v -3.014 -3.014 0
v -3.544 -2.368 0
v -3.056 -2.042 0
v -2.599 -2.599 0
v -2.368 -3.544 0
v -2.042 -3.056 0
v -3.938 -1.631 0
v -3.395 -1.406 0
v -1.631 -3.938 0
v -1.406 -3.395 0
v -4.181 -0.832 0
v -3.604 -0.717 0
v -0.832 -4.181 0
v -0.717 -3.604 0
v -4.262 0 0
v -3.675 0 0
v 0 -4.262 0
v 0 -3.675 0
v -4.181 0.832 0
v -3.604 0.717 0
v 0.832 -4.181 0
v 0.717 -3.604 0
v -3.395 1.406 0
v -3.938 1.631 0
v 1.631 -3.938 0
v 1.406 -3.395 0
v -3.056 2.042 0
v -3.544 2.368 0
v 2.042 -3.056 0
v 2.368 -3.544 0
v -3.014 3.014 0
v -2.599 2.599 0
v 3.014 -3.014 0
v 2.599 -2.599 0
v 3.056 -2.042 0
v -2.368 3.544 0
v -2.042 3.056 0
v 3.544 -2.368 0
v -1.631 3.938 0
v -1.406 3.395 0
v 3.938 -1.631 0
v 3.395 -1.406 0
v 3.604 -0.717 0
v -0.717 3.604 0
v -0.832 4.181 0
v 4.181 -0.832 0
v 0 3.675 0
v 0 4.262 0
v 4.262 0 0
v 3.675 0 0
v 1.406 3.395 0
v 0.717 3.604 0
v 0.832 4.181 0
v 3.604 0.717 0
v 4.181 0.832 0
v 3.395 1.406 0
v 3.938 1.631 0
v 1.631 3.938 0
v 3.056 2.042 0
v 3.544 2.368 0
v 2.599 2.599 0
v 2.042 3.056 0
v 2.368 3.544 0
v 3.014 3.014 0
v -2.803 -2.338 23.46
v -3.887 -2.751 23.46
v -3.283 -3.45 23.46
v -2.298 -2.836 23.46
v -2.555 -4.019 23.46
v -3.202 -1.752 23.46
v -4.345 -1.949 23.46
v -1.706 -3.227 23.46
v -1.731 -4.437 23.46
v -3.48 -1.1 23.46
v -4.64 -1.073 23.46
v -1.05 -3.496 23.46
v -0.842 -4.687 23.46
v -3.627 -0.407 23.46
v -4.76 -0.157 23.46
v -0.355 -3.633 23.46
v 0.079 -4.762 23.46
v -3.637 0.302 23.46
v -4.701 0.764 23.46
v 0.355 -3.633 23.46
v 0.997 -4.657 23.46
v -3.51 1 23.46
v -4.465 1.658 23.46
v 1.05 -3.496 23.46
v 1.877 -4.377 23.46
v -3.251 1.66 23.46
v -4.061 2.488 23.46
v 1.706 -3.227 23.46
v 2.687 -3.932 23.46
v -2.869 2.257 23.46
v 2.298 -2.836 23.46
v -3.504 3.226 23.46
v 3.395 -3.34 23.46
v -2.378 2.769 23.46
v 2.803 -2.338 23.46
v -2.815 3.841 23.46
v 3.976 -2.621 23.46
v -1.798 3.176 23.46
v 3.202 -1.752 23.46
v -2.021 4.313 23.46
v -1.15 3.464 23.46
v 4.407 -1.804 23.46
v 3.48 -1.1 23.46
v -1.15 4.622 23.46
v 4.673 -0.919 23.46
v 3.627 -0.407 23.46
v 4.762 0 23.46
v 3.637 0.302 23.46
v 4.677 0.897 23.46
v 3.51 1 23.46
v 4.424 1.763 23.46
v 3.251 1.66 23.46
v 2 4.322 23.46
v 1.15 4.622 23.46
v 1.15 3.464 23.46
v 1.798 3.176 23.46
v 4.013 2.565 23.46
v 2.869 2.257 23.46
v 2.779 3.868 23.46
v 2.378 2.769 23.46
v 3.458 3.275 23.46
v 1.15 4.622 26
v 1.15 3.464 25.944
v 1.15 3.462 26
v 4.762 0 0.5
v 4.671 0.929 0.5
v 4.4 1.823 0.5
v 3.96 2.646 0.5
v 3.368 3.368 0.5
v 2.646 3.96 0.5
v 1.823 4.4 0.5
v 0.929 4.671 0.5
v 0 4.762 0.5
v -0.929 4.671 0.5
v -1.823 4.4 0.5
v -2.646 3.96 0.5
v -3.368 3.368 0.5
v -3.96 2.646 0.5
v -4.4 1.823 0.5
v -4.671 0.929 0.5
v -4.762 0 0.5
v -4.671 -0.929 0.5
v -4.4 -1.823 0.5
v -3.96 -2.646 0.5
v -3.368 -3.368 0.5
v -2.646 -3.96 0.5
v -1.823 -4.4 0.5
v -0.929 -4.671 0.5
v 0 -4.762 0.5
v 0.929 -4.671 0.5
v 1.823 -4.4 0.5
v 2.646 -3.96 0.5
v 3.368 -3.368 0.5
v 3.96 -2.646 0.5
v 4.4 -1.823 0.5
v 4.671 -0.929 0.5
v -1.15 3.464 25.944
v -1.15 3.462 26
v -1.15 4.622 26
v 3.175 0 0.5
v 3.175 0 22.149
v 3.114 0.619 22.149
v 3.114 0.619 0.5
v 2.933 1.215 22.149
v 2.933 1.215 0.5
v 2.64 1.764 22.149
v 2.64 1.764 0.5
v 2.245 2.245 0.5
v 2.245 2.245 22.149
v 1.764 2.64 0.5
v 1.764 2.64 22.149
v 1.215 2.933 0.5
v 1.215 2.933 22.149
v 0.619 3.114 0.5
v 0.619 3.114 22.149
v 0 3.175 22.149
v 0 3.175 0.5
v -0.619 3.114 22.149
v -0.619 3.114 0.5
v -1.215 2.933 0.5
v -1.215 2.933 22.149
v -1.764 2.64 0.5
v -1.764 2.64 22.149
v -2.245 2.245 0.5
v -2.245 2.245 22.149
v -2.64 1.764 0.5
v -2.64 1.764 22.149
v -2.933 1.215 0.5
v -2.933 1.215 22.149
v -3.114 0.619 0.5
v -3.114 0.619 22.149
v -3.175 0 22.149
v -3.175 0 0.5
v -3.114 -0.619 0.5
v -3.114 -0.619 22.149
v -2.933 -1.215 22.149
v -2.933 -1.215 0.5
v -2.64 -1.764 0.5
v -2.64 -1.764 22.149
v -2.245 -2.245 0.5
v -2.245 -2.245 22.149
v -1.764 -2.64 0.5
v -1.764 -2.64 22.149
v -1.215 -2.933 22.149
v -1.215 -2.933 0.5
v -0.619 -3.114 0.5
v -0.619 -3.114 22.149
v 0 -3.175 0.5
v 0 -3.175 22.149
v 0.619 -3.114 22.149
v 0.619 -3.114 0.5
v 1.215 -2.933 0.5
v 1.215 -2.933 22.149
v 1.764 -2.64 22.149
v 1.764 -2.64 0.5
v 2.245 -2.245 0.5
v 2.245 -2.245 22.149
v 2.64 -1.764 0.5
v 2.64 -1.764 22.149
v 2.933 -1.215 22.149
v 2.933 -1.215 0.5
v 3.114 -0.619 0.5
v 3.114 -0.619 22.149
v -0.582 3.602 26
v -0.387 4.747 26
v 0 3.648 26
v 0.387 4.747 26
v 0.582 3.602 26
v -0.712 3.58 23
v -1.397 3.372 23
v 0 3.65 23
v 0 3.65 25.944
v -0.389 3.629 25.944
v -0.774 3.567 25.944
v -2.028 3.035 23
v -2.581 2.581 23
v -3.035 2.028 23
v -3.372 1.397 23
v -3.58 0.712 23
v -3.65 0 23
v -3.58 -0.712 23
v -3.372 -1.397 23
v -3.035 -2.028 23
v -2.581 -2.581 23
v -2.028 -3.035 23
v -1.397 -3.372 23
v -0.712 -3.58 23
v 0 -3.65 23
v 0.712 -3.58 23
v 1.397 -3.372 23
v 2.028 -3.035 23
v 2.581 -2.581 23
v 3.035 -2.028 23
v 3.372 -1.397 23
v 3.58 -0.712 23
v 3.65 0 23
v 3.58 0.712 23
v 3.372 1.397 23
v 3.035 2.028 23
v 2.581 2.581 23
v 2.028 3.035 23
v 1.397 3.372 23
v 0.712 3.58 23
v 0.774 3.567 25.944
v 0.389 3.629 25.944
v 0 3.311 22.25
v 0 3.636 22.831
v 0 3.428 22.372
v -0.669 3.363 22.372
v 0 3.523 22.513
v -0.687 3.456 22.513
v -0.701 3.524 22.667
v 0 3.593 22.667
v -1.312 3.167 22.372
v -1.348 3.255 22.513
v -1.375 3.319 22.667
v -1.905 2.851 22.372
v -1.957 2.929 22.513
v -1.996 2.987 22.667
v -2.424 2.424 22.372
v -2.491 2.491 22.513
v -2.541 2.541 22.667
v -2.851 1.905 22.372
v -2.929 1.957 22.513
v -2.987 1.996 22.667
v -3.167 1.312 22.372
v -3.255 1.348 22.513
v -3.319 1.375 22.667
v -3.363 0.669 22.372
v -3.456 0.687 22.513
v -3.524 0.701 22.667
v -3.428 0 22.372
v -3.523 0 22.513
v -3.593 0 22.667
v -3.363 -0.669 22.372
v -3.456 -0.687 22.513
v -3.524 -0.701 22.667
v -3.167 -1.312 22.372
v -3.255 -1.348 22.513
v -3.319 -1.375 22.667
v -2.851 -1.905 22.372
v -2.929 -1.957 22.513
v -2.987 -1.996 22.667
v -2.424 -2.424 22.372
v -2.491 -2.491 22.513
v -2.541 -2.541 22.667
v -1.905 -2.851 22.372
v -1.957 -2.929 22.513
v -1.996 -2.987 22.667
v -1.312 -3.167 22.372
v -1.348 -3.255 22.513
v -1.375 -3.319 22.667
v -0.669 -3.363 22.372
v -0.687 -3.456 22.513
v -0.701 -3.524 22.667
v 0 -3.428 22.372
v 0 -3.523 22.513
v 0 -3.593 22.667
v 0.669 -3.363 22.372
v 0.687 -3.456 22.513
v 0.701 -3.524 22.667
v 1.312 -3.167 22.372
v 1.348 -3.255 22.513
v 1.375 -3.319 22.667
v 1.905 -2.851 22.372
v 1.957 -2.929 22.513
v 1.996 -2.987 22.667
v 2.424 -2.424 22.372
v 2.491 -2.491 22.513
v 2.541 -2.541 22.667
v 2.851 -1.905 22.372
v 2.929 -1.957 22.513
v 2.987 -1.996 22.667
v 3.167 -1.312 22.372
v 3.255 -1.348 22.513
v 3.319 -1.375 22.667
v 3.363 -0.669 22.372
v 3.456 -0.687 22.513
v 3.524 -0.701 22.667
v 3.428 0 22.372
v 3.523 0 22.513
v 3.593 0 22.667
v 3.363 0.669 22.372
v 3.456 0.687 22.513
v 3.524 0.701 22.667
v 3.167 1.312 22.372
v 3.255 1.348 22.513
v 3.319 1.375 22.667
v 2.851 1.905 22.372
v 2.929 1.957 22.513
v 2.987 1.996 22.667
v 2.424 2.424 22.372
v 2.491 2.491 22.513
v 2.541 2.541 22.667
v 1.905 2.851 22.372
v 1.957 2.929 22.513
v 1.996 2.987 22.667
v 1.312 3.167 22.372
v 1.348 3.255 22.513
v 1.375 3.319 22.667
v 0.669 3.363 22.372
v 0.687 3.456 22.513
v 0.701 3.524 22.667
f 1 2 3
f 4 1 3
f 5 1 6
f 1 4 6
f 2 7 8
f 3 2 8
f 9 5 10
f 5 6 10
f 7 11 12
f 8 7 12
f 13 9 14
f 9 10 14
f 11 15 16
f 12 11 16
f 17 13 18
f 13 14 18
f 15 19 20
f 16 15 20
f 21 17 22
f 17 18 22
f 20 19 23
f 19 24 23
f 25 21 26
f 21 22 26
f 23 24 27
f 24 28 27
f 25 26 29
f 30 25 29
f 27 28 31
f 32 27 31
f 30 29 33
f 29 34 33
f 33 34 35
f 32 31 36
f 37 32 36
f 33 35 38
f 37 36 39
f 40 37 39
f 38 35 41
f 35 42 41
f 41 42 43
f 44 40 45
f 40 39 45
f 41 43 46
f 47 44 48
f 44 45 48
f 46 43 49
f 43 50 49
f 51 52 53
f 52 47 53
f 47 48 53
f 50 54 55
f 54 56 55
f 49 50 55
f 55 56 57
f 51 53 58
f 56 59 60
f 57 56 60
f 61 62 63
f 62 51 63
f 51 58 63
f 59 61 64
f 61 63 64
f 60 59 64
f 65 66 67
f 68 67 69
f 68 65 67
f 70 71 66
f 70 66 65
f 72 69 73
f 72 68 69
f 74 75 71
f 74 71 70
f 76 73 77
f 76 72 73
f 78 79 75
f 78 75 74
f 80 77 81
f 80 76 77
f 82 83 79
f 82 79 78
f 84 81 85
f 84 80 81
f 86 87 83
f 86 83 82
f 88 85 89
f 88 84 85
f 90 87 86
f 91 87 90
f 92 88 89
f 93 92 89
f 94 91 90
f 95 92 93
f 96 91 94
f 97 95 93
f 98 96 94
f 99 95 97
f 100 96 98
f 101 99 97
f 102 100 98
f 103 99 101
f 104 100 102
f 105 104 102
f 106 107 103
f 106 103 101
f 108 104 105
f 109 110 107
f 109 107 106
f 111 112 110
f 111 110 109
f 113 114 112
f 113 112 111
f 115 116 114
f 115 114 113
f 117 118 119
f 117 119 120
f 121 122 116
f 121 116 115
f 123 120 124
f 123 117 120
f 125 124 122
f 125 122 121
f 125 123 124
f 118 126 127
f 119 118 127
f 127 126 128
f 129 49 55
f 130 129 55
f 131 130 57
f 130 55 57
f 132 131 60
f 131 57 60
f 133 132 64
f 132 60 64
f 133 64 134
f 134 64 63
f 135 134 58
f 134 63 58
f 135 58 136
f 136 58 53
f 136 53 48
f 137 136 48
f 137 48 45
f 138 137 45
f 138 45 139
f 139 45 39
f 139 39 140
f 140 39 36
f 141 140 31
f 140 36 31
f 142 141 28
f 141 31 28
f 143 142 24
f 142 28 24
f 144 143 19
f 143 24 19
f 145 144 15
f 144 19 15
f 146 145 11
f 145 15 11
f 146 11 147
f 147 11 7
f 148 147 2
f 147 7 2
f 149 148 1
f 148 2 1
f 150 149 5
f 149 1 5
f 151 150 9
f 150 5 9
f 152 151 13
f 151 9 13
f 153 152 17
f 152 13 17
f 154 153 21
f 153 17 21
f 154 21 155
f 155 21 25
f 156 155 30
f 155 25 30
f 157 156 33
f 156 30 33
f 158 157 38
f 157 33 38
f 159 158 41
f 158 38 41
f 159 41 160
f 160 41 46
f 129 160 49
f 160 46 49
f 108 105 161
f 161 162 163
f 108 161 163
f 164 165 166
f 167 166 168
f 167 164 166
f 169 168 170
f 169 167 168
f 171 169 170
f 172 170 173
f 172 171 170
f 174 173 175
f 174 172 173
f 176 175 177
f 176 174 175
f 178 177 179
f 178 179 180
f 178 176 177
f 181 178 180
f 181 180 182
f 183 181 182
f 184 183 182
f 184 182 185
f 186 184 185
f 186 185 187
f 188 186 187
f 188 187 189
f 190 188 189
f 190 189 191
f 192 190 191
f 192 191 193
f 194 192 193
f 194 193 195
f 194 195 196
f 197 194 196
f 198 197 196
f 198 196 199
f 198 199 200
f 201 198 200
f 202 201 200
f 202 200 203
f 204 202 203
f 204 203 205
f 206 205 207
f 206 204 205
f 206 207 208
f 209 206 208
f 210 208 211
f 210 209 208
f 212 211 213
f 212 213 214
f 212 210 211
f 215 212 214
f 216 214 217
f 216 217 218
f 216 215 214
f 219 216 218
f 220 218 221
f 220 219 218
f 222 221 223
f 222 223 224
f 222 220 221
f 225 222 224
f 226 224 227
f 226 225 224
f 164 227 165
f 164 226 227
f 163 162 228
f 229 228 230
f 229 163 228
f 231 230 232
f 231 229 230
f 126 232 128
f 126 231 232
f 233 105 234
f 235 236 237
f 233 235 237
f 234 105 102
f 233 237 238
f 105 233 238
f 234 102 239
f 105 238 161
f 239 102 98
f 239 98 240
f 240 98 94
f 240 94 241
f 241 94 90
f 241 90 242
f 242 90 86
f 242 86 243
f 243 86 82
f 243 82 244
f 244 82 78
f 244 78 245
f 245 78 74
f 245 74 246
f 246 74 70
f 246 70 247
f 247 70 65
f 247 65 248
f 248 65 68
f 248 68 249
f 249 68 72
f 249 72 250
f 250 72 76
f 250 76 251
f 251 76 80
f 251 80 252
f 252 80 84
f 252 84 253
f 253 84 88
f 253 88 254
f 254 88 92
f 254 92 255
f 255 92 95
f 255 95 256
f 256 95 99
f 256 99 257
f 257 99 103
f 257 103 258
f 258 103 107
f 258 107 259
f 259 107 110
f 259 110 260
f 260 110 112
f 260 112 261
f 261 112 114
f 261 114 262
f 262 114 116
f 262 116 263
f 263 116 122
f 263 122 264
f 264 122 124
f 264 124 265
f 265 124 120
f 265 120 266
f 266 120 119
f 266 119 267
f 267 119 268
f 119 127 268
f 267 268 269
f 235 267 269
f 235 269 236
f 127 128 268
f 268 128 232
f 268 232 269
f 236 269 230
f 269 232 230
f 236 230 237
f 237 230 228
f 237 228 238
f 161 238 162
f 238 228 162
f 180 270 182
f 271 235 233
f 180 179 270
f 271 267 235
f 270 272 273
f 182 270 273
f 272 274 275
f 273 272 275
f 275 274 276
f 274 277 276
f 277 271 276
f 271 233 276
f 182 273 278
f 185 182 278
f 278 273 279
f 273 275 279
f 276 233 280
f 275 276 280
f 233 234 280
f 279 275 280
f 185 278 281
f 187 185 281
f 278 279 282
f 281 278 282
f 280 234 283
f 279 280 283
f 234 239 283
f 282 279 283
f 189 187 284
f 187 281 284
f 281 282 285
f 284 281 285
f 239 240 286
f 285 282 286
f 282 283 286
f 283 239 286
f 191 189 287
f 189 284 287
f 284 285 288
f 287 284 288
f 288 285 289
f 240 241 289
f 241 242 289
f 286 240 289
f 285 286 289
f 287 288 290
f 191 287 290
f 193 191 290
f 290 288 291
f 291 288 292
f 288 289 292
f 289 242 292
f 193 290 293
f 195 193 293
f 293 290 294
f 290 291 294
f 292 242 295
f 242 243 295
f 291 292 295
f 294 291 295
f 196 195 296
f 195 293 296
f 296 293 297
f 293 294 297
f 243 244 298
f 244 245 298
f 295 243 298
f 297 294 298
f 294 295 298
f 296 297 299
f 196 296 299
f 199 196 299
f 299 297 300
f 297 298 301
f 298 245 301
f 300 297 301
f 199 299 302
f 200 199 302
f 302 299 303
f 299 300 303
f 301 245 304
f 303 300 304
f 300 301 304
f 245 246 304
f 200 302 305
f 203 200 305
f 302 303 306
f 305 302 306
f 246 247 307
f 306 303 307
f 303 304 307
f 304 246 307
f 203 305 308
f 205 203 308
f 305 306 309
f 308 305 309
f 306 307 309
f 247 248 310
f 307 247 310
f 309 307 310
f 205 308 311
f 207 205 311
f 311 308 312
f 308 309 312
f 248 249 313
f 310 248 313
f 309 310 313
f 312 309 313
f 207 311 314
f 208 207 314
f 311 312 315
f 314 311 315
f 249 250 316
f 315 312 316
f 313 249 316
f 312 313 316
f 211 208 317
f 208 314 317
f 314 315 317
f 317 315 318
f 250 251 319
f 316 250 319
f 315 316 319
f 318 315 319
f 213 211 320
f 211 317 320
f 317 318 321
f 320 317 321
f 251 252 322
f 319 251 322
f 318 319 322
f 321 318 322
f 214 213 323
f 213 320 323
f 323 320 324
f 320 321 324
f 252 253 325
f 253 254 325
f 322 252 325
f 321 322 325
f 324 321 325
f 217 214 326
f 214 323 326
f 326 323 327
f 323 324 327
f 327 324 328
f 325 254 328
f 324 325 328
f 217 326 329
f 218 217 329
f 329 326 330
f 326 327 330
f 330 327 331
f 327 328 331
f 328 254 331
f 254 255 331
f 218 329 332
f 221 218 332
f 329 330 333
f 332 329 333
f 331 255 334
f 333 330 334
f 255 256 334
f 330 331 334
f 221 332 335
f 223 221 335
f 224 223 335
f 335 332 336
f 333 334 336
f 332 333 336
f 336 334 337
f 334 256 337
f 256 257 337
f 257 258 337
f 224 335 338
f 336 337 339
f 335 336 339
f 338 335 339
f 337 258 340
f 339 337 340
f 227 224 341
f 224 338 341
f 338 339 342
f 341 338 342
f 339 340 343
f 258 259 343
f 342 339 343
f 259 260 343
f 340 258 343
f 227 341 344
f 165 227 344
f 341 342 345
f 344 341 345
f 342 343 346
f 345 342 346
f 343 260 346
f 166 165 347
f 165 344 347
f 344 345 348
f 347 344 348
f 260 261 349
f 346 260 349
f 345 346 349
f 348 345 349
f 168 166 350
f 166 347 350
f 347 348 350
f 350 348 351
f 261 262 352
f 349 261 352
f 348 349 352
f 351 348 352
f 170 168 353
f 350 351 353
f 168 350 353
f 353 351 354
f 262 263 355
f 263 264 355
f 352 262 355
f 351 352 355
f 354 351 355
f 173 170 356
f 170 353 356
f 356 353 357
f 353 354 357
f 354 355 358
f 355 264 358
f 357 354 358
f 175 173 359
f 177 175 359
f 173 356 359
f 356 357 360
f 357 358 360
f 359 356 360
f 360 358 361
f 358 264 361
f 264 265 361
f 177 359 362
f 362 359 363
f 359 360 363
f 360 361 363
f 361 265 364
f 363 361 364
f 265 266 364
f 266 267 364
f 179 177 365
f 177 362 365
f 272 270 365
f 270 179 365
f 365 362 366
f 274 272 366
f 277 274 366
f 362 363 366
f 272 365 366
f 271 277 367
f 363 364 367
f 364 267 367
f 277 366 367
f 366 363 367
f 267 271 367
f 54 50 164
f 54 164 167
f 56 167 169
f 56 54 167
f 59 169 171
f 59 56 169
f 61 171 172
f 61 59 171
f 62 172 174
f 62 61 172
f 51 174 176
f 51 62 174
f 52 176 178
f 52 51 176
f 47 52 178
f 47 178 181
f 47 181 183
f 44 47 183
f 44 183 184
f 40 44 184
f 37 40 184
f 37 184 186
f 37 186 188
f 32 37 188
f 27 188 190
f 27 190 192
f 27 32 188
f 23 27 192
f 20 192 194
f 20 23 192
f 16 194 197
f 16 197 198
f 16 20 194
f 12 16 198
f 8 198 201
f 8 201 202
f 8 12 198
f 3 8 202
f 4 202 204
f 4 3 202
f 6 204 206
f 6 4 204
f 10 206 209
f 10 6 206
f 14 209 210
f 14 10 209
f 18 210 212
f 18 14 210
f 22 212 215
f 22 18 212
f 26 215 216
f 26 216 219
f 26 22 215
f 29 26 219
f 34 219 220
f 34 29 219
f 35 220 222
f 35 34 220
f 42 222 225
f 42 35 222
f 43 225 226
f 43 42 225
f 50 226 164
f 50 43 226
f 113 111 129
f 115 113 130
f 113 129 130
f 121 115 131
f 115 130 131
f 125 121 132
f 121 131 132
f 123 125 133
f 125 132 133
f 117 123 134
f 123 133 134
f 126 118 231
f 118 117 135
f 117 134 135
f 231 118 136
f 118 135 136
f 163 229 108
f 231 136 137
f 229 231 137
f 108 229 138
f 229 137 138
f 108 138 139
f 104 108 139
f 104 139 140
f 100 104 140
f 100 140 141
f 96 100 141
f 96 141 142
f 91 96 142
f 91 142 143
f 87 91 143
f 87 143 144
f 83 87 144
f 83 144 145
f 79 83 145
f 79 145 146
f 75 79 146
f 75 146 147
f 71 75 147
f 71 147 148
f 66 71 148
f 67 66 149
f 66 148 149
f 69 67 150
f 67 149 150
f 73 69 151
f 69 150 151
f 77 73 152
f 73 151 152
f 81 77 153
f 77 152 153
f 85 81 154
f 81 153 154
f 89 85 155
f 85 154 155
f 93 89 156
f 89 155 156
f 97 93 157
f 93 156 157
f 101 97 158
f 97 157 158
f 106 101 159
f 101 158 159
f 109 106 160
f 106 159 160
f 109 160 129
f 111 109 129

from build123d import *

# Parameters (mm, degrees)
SKETCH_R     = 4.7625
SKETCH_R_2   = 3.175
PAD_DEPTH    = 26
POCKET_DEPTH = 2.54
CHAMFER_SIZE = 0.5


with BuildPart() as part:
    # Sketch → Pad (new body)
    with BuildSketch(Plane.XY):
        Circle(SKETCH_R)
        Circle(SKETCH_R_2, mode=Mode.SUBTRACT)
    extrude(amount=PAD_DEPTH)

    # Sketch001 (on Face4 of Pad) → Pocket (cut)
    with BuildSketch(Plane.XY.offset(26)):
        with BuildLine():
            Line((1.15, 4.943999), (1.15, 2.567225))
            ThreePointArc((-1.15, 2.567225), (0, -2.813031), (1.15, 2.567225))
            Line((-1.15, 2.567225), (-1.15, 4.943999))
            ThreePointArc((-1.15, 4.943999), (0, -5.075985), (1.15, 4.943999))
        make_face()
    extrude(amount=-POCKET_DEPTH, mode=Mode.SUBTRACT)

    # Sketch002 → Groove (revolve, cut)
    with BuildSketch(Plane.YZ):
        with BuildLine():
            ThreePointArc((3.65, 25.944313), (2.65, 26.944313), (1.65, 25.944313))
            Line((1.65, 25.944313), (1.65, 23))
            ThreePointArc((1.65, 23), (2.65, 22), (3.65, 23))
            Line((3.65, 23), (3.65, 25.944313))
        make_face()
    revolve(axis=Axis((0, 0, 0), (0, 0, 1)), mode=Mode.SUBTRACT)

    # Chamfer
    chamfer_edges = [part.edges().sort_by_distance(p)[0] for p in [
        (-4.7625, 0, 0),
        (-3.175, 0, 0),
    ]]
    chamfer(chamfer_edges, length=CHAMFER_SIZE)


solid = part.part
